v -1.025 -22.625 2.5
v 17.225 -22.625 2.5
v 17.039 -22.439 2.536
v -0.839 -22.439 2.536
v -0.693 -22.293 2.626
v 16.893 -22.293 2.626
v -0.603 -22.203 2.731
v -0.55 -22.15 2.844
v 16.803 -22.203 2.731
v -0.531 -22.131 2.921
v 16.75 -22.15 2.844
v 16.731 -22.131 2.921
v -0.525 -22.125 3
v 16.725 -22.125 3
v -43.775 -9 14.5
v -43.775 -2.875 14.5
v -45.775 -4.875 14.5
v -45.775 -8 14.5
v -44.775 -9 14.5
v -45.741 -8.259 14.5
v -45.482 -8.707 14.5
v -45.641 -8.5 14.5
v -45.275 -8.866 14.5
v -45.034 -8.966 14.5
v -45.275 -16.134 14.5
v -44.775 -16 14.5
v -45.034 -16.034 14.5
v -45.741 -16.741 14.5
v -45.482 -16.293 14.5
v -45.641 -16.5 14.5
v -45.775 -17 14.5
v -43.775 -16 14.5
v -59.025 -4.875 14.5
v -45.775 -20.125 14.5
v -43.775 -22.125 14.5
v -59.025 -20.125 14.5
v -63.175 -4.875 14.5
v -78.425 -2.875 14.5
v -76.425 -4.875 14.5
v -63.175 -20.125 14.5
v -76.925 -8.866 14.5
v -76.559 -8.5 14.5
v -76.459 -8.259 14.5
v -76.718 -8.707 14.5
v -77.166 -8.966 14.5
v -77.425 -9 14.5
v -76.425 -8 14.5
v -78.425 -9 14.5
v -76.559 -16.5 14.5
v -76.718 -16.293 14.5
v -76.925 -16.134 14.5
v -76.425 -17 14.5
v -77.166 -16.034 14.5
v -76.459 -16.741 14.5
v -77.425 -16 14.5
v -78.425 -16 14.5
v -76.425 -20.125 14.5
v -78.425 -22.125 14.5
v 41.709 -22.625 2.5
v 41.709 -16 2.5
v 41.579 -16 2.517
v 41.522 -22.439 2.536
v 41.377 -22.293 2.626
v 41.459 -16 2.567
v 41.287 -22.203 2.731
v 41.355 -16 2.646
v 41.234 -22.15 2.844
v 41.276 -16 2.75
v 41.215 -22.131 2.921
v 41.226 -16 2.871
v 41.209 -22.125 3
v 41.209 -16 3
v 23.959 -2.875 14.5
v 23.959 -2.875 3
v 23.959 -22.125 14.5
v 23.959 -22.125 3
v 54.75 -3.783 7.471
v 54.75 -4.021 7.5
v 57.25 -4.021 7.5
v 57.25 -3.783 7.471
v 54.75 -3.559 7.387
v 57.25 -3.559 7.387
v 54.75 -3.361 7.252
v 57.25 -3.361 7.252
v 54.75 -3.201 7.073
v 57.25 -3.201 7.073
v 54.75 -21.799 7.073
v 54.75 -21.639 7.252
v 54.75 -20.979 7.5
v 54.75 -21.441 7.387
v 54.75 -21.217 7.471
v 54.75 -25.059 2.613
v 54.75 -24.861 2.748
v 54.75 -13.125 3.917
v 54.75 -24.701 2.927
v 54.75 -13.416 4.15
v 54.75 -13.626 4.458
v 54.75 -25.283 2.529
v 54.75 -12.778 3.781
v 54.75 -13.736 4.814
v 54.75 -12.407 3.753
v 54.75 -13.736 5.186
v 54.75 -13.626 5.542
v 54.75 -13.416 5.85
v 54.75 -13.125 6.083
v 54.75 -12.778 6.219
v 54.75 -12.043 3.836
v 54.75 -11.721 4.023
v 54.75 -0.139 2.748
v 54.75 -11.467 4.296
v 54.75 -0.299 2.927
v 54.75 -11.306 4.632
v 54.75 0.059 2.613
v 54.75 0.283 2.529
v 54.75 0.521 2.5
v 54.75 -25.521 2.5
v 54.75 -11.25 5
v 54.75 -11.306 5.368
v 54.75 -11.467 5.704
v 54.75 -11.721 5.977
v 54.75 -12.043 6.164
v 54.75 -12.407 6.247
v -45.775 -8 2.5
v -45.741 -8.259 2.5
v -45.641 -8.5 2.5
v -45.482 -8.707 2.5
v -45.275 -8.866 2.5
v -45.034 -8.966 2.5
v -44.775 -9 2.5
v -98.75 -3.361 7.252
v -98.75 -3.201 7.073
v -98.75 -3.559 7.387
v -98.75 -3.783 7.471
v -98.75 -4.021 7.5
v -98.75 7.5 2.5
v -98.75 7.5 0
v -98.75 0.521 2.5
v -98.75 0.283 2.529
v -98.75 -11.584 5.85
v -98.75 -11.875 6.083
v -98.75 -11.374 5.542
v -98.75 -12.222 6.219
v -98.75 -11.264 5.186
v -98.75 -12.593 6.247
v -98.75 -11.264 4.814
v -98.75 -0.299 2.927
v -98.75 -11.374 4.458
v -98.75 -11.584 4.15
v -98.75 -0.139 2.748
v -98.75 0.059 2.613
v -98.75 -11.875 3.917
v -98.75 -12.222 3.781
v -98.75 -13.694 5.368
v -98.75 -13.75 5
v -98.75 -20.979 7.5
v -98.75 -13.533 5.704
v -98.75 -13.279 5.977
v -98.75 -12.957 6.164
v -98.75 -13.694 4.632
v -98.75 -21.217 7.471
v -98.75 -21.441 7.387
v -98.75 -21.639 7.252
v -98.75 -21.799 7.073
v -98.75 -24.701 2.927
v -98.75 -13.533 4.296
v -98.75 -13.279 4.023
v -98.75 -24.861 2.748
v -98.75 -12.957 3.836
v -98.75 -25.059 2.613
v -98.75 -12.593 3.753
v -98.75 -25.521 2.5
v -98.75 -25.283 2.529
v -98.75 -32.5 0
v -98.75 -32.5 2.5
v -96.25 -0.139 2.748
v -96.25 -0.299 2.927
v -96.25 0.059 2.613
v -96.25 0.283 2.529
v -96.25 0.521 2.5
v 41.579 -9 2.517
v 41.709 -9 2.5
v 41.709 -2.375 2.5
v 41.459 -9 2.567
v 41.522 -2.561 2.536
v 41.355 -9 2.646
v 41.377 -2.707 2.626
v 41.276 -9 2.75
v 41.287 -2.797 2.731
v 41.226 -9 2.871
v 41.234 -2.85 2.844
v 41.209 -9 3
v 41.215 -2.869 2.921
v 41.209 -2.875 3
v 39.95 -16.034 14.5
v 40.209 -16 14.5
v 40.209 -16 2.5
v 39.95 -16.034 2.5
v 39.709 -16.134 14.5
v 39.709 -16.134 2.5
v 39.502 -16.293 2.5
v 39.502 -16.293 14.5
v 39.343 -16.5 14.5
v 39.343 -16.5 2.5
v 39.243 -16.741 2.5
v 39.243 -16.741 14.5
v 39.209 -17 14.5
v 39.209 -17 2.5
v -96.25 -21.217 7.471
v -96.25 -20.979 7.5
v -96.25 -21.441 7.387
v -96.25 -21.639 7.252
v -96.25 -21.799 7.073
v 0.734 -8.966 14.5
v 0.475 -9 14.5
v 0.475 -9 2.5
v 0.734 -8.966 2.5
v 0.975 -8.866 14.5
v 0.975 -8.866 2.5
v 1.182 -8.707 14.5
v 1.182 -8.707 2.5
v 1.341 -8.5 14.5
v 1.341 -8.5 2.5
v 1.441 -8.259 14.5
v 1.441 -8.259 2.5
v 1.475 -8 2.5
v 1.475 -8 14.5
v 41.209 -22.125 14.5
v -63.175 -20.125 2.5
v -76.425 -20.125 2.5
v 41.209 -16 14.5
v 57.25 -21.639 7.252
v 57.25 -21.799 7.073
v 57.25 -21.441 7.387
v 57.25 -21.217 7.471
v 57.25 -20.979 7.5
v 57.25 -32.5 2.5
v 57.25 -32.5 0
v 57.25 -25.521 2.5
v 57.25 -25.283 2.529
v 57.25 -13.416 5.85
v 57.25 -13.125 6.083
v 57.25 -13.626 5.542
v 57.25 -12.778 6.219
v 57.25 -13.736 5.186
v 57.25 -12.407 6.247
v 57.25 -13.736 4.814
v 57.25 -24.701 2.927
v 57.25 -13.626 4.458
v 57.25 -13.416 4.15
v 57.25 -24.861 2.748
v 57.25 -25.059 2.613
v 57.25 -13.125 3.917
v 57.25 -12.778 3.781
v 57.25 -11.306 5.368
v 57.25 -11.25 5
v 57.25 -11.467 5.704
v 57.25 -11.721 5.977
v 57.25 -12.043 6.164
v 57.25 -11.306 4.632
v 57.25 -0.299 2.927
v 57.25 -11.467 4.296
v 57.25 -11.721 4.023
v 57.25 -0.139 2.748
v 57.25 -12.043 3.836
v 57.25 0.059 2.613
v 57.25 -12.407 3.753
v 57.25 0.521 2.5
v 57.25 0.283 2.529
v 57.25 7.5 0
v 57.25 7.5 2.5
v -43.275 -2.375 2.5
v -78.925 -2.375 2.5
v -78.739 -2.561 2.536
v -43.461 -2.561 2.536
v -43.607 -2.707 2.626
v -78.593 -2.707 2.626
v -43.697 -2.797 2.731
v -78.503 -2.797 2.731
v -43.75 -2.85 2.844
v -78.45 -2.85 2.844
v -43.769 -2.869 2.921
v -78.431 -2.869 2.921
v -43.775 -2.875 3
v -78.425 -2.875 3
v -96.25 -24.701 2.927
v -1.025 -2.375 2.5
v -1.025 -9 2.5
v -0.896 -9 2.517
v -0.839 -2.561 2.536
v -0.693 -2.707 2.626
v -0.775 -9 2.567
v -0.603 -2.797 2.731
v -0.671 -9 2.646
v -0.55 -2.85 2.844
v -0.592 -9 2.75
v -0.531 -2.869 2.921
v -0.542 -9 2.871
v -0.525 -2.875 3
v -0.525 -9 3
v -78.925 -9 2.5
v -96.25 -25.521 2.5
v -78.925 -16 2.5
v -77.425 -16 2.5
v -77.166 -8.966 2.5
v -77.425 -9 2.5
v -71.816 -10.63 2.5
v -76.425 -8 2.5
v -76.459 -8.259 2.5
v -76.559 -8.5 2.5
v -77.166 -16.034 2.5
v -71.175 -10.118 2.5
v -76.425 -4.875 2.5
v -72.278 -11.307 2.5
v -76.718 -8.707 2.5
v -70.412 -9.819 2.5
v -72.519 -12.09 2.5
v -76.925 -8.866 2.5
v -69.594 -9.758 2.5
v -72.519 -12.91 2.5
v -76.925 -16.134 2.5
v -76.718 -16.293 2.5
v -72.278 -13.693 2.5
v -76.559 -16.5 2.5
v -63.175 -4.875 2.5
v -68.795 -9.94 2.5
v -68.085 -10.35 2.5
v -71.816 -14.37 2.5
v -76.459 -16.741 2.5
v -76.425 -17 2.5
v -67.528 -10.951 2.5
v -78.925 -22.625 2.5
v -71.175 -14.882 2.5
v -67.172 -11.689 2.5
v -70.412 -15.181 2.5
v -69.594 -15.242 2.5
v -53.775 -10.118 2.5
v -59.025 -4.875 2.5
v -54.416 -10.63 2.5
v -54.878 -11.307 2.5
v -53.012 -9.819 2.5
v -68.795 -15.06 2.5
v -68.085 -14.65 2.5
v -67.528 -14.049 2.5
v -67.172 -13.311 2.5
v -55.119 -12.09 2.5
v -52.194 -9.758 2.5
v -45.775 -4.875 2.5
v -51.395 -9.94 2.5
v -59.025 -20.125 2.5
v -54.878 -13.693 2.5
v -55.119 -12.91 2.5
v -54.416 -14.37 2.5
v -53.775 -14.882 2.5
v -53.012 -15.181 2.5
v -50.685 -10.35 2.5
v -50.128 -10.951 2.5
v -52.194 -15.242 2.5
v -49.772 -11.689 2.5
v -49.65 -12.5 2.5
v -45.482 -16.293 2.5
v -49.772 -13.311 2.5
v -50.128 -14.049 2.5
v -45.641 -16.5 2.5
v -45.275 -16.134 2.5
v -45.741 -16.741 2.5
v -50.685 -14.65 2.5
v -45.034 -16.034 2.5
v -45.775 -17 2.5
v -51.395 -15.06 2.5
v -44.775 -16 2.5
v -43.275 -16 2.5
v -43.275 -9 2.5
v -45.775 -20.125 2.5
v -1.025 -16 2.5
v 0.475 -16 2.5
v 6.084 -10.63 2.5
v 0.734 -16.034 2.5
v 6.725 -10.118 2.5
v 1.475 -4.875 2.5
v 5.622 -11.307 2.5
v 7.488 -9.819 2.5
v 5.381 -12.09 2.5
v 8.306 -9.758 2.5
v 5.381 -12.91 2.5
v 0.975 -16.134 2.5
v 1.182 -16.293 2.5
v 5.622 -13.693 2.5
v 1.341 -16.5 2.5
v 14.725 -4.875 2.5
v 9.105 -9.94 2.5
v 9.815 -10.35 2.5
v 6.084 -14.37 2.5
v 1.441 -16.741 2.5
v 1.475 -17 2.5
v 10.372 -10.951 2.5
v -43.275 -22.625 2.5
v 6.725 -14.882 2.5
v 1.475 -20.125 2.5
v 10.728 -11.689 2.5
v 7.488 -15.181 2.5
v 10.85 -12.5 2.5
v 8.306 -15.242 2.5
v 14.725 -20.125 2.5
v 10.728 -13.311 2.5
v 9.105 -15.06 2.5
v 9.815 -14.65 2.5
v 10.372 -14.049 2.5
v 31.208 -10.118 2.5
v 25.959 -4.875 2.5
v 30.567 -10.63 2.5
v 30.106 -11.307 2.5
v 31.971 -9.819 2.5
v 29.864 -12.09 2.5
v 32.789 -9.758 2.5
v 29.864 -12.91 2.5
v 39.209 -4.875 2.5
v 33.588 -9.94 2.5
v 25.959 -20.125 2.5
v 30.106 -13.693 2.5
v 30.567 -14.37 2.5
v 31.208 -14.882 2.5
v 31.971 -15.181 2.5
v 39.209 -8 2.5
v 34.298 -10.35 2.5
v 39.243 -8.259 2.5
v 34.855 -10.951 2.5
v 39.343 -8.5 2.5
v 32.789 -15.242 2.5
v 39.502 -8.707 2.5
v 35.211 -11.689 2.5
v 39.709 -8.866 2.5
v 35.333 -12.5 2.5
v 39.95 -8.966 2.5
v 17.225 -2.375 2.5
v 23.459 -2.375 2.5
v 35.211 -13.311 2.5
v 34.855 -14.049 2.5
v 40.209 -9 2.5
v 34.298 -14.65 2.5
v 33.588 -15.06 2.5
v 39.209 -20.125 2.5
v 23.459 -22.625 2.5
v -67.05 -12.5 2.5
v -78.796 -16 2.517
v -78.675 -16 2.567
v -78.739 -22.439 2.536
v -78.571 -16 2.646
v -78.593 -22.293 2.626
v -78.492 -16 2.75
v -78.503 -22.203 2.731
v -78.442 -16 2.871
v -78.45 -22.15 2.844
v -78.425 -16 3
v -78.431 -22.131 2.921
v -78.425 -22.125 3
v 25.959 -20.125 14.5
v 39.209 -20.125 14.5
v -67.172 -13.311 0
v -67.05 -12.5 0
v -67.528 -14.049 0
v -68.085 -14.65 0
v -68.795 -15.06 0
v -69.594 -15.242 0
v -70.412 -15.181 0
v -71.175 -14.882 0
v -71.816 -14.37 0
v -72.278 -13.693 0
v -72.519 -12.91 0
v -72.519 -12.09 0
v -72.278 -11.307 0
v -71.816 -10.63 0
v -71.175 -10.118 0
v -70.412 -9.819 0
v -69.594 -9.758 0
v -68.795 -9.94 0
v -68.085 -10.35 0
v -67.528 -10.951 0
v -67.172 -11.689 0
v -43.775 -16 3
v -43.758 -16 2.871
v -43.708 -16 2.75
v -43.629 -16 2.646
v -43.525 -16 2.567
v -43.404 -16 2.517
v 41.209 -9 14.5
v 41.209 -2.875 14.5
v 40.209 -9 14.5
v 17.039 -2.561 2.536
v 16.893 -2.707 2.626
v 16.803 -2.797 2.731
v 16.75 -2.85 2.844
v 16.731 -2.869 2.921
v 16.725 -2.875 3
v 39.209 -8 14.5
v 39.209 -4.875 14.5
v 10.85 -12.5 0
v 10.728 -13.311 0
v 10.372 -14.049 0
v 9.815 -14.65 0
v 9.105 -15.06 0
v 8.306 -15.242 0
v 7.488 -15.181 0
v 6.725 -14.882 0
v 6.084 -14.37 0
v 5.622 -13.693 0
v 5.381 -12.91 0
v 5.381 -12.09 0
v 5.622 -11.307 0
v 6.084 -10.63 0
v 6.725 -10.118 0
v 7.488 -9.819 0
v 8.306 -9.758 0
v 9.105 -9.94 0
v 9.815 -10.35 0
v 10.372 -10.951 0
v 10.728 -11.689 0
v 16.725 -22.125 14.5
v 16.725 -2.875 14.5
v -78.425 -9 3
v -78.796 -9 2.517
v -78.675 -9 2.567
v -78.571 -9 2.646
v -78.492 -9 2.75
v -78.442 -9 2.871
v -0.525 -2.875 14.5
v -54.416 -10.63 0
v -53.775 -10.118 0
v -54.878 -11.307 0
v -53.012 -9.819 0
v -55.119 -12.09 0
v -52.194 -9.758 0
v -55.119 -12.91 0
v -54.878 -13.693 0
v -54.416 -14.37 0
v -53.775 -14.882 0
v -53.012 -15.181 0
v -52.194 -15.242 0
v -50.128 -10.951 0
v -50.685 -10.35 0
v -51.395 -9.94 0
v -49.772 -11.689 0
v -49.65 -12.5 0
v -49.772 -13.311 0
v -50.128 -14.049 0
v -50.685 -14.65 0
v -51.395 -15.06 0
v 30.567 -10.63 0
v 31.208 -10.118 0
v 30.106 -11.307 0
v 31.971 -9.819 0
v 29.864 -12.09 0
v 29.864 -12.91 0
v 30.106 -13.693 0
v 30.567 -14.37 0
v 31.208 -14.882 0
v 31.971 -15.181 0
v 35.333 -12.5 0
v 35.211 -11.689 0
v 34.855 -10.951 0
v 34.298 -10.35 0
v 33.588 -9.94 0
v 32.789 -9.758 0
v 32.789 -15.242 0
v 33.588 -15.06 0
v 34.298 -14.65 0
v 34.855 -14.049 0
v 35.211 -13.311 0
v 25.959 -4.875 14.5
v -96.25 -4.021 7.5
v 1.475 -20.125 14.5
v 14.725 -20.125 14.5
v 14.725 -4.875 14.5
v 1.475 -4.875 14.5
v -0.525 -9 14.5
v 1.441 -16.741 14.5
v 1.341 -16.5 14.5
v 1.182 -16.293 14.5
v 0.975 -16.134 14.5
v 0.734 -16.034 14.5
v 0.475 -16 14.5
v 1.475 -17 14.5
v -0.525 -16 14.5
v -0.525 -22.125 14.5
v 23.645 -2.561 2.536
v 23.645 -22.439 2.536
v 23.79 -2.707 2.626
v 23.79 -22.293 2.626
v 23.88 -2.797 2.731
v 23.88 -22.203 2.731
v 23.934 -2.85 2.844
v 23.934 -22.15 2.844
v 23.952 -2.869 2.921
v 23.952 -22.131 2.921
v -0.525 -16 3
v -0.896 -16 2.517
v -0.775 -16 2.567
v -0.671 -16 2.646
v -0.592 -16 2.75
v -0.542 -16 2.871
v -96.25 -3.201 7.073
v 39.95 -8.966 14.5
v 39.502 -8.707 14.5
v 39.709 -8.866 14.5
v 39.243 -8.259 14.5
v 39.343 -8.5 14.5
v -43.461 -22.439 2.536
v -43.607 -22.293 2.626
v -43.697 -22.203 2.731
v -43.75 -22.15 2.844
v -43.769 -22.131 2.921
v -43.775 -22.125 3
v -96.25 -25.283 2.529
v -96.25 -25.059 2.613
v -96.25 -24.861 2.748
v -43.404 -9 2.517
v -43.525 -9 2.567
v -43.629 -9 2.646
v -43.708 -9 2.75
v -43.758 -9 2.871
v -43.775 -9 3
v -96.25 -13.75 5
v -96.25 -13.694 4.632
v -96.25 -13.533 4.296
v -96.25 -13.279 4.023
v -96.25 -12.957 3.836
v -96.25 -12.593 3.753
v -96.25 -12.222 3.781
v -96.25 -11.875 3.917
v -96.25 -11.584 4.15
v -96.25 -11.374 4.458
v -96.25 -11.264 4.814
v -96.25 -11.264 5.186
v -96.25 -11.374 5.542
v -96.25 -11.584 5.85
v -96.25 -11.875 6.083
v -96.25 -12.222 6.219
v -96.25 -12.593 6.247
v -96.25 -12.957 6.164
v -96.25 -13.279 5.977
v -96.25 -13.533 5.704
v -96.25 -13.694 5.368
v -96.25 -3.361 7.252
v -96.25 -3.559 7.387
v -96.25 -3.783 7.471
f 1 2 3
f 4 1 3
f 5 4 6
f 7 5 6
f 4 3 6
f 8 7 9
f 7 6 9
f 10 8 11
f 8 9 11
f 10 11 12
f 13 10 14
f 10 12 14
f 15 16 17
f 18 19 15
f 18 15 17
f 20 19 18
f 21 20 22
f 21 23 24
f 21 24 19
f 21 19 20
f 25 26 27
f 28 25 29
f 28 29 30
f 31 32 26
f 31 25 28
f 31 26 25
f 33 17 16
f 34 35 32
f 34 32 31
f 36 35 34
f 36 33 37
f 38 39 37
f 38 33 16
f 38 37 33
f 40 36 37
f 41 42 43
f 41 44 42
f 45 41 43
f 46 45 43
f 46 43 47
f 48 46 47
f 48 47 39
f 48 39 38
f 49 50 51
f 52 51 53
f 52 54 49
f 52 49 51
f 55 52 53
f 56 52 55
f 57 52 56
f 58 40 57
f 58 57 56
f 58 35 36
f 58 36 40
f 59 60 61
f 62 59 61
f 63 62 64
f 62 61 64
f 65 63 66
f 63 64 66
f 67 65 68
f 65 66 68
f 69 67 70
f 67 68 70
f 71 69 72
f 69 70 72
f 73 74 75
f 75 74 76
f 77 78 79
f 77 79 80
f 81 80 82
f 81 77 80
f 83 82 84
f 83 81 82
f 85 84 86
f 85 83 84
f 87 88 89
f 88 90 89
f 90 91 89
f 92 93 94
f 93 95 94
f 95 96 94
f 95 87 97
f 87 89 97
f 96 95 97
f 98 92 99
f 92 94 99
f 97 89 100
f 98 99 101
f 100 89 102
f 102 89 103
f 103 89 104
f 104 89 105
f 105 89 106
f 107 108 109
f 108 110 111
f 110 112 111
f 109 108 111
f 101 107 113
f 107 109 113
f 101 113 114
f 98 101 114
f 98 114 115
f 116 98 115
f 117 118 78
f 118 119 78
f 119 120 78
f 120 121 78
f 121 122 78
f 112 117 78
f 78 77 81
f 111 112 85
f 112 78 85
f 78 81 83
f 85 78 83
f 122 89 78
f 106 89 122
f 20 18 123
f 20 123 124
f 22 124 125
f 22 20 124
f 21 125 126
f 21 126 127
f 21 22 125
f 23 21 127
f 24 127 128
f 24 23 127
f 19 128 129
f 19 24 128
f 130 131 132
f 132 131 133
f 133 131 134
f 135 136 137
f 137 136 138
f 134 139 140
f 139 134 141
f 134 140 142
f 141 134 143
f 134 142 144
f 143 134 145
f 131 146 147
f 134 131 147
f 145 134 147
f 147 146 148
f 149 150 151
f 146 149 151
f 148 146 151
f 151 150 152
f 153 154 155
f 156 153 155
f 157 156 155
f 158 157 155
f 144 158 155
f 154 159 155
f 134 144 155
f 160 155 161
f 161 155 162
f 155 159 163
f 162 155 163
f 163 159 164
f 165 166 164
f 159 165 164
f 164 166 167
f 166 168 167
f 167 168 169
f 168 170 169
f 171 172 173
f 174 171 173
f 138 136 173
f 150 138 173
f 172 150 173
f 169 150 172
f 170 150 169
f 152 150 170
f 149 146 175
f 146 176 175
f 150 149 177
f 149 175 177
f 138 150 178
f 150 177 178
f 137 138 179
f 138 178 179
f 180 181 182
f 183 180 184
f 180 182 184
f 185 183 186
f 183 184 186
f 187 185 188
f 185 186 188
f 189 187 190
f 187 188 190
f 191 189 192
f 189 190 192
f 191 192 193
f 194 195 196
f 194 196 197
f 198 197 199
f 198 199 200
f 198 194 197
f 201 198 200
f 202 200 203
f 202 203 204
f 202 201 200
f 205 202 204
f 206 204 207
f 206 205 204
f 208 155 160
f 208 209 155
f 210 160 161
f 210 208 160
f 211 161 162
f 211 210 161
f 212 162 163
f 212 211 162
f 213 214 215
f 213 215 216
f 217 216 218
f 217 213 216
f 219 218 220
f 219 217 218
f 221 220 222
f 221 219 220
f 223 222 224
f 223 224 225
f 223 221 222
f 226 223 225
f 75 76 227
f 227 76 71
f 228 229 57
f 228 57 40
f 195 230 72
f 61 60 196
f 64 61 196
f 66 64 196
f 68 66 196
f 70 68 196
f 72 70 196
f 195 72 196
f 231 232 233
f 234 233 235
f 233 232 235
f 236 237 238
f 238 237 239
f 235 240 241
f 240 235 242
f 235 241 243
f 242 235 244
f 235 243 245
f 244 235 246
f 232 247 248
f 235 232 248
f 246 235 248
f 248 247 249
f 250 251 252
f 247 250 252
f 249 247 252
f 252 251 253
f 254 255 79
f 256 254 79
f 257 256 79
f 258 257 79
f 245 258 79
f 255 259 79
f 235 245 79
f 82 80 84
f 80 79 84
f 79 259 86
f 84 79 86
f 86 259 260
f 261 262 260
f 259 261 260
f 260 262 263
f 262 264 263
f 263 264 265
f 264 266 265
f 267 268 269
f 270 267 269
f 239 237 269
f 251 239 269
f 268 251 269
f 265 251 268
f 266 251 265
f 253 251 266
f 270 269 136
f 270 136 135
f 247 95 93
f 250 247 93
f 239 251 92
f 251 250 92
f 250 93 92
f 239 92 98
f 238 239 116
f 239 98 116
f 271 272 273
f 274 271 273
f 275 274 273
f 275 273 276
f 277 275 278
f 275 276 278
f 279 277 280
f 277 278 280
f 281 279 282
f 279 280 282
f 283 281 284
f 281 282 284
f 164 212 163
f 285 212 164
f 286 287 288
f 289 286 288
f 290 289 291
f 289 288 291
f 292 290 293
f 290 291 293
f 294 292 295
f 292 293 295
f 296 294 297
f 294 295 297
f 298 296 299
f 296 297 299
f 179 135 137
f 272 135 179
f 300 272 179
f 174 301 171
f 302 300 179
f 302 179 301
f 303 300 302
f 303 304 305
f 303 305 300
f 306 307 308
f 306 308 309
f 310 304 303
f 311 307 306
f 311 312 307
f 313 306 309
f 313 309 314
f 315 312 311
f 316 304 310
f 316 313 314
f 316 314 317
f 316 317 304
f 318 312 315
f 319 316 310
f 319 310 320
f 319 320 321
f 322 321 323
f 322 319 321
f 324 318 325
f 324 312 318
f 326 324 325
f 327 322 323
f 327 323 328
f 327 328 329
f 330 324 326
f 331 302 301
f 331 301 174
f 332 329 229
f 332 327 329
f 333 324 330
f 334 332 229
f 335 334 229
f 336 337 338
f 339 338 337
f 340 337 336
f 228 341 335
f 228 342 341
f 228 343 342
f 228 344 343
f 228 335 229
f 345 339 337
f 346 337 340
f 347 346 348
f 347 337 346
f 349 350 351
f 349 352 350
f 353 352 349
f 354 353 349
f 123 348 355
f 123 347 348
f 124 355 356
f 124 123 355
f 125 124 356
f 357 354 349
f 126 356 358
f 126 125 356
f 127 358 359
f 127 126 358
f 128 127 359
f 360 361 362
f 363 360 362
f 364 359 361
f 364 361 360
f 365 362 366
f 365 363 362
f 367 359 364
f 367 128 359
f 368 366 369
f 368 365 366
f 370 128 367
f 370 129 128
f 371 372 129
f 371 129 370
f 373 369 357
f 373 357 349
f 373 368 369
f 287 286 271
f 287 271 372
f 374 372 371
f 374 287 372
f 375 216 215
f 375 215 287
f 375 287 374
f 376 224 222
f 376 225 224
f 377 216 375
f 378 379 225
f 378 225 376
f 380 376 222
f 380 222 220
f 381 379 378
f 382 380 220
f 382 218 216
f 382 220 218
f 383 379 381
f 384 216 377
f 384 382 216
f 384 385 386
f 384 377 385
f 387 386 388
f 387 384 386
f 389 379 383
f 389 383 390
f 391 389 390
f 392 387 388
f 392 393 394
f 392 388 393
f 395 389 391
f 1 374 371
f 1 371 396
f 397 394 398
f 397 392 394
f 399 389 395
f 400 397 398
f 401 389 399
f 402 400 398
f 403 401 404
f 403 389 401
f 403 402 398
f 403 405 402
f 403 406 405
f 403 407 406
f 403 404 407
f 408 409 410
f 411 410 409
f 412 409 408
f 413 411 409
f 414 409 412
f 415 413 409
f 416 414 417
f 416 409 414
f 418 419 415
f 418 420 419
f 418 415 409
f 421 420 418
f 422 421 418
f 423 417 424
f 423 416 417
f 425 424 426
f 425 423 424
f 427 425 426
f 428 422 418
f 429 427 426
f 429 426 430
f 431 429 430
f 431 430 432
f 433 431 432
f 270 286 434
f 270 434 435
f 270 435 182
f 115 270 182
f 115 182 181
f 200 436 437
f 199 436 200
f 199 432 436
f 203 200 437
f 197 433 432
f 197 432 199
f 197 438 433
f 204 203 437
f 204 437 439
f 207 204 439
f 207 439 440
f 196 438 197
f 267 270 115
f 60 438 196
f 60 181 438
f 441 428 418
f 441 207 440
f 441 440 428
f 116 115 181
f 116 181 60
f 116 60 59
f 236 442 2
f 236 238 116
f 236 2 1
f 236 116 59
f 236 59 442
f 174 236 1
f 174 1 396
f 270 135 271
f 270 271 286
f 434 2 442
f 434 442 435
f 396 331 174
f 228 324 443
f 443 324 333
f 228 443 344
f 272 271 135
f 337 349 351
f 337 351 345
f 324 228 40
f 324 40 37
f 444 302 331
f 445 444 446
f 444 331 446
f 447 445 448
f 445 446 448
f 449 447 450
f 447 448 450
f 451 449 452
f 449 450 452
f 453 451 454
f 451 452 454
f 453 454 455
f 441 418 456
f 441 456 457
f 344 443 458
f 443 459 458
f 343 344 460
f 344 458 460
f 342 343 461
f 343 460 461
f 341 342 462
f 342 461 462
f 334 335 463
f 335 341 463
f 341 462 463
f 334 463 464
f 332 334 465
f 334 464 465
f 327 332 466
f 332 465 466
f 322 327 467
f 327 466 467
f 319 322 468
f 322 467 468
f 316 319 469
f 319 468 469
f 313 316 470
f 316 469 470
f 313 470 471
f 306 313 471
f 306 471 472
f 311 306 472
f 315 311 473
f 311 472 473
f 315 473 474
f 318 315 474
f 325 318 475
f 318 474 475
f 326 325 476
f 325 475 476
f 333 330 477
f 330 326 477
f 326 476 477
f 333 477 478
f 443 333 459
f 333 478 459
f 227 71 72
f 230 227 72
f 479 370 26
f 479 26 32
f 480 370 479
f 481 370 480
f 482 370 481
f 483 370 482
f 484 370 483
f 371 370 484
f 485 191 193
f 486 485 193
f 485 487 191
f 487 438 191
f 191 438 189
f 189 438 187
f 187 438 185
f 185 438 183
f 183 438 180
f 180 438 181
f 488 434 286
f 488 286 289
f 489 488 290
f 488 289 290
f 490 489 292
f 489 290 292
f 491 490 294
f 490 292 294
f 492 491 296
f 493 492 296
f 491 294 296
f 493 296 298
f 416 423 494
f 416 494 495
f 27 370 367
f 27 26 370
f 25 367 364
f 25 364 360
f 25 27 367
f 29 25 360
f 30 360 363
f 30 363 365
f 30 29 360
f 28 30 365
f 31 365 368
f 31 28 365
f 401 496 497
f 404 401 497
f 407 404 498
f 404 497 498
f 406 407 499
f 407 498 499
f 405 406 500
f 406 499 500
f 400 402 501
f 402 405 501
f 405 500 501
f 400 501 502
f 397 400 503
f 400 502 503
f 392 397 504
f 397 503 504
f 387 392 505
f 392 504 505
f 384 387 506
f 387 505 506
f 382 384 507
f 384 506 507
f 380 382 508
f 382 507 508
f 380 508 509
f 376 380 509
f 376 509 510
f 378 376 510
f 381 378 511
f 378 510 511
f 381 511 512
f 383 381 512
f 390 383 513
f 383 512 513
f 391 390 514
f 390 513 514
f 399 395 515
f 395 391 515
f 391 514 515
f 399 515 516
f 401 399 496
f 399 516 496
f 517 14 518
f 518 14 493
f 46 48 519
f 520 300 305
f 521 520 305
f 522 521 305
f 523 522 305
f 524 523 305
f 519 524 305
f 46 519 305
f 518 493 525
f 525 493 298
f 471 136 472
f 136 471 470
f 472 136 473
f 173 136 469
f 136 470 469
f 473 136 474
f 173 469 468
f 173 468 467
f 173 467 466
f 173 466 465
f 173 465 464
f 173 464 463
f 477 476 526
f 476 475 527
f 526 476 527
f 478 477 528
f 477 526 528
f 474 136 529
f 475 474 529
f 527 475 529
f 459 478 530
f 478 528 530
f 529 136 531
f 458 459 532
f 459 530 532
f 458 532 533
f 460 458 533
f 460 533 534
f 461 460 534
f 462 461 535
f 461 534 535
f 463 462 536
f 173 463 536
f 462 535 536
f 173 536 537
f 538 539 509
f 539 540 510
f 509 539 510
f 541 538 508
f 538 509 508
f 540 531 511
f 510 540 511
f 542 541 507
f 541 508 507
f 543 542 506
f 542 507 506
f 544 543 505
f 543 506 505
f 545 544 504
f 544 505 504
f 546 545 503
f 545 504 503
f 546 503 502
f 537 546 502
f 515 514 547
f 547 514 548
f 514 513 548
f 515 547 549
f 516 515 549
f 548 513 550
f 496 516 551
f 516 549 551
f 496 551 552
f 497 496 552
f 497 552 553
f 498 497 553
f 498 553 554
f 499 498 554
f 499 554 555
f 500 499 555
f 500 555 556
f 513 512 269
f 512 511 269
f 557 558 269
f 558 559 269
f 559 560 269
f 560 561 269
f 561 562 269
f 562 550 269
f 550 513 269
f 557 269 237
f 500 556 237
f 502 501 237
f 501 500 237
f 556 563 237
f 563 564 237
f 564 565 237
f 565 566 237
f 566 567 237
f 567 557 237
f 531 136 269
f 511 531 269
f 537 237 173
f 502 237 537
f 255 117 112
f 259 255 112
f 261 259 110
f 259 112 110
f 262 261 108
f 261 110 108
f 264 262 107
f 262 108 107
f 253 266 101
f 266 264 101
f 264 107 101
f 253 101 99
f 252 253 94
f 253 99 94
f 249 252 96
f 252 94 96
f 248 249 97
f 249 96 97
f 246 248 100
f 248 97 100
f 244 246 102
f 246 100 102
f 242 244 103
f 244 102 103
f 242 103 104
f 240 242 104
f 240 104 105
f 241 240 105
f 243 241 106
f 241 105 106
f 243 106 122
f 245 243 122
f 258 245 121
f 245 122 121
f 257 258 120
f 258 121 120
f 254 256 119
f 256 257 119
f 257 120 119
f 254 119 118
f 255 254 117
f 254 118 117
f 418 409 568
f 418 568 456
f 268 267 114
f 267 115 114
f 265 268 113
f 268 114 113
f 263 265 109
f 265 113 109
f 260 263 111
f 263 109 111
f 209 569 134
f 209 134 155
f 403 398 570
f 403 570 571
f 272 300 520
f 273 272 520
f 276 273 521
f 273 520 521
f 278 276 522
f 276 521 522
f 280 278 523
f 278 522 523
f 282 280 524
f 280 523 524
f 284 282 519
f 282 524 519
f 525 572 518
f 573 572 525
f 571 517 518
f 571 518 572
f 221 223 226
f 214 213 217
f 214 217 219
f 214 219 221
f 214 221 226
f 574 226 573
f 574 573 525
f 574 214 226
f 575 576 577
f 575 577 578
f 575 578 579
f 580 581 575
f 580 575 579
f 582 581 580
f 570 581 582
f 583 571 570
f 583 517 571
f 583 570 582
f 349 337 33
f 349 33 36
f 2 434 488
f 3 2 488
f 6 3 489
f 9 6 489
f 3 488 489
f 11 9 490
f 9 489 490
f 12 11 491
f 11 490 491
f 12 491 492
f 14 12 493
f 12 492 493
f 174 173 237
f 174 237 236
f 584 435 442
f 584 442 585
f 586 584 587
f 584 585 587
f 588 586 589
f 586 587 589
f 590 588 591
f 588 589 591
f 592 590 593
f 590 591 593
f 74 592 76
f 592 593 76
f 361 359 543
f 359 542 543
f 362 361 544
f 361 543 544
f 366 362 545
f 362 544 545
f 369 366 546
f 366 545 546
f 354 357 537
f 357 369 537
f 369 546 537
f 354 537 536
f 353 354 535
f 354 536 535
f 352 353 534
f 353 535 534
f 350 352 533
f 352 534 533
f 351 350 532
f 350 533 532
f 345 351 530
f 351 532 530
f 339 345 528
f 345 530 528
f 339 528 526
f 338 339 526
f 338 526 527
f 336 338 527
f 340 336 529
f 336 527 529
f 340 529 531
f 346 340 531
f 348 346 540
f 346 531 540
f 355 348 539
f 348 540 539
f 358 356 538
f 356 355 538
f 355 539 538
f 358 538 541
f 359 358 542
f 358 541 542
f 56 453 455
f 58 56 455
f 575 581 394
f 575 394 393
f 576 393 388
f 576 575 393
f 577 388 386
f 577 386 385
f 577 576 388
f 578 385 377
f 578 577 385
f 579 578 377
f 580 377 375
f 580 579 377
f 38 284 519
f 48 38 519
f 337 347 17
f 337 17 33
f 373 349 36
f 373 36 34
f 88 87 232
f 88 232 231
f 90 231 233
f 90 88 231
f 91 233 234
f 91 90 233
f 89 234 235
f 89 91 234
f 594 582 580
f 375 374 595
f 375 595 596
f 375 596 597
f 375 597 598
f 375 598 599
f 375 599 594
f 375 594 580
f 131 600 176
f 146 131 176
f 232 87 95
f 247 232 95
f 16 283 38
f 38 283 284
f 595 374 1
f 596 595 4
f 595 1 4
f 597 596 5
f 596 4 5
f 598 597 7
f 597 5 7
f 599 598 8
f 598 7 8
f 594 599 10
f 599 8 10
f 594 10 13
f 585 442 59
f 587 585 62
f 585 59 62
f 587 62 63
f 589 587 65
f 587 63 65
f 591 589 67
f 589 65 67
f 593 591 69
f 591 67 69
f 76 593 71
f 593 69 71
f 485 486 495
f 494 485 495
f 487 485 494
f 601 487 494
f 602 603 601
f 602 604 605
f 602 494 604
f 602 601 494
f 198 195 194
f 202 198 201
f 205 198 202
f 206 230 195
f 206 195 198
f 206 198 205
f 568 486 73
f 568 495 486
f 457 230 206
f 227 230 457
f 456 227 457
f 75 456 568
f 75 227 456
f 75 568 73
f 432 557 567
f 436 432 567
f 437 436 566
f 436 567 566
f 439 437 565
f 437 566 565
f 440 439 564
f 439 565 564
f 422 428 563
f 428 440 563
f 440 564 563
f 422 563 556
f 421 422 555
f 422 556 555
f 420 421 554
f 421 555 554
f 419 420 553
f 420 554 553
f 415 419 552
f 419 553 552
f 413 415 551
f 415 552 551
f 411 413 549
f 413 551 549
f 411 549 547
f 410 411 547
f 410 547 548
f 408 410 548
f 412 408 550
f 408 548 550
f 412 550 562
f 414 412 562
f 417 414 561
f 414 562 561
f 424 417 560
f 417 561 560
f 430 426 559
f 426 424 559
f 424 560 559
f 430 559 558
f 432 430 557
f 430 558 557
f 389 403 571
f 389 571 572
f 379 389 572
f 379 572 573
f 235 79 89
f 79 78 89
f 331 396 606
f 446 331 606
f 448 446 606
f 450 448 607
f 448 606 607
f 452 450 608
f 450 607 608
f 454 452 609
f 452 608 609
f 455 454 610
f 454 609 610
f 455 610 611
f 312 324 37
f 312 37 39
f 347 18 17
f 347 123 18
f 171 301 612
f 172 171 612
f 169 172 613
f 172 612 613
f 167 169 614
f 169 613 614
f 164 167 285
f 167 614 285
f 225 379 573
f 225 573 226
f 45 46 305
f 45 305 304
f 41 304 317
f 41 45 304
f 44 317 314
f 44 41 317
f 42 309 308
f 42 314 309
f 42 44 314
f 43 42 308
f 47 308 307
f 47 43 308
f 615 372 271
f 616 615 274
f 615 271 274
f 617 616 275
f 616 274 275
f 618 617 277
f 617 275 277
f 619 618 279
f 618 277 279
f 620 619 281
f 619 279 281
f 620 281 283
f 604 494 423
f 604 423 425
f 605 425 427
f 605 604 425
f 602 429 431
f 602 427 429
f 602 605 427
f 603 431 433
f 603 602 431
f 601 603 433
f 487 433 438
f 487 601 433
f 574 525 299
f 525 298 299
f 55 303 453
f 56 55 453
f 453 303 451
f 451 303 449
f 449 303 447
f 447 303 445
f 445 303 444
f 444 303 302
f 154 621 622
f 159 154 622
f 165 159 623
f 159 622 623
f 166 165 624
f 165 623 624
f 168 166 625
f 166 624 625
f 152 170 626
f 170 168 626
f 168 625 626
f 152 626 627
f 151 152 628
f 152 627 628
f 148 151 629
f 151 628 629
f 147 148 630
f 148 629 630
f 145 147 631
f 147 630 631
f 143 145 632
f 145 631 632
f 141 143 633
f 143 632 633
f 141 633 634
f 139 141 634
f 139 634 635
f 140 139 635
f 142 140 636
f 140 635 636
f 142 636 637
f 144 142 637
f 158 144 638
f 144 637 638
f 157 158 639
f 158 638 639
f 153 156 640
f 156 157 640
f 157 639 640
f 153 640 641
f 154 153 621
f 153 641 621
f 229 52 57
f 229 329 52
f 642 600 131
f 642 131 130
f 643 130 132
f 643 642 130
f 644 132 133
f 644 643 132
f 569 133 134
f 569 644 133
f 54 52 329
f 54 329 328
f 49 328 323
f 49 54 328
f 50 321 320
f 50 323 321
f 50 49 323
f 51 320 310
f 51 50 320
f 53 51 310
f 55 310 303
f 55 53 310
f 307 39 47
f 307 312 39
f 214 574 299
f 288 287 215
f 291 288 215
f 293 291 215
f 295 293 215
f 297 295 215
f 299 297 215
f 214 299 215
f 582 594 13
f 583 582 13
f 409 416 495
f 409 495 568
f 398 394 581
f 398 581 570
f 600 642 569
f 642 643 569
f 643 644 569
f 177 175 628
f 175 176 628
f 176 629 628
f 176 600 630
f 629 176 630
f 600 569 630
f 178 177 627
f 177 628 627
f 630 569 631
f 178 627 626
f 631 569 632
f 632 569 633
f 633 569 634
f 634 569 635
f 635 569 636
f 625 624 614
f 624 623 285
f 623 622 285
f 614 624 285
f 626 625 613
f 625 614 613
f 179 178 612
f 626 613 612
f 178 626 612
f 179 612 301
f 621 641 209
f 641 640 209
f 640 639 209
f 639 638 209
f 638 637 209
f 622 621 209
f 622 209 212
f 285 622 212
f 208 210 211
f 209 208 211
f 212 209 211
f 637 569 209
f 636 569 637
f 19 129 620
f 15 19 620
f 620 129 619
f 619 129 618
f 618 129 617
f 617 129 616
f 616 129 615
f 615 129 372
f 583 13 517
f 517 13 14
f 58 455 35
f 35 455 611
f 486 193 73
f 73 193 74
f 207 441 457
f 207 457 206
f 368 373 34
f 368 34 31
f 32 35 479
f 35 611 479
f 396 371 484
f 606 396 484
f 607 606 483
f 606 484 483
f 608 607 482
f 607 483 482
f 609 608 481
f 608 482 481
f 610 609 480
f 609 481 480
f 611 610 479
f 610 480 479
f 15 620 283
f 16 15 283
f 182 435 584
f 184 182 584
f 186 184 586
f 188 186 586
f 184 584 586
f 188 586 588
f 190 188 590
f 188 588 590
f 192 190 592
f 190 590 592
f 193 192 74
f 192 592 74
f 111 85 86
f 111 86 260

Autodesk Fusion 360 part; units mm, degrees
sketch "Sketch1" plane through (0, 0, 0) normal (0, 0, 1) x (1, 0, 0)
  line L0 (68.541, -12.5) -> (-110, -12.5) construction
  line L1 (-20.75, -50) -> (-20.75, 25) construction
  point P0 (-20.75, -12.5)
sketch "Sketch2" plane through (0, 0, 0) normal (0, 0, 1) x (1, 0, 0)
  line L0 (54.25, 7.5) -> (-95.75, 7.5)
  line L1 (-95.75, 7.5) -> (-95.75, -32.5)
  line L2 (-95.75, -32.5) -> (54.25, -32.5)
  line L3 (54.25, -32.5) -> (54.25, 7.5)
  line L4 (54.25, 7.5) -> (-95.75, -32.5) construction
  line L5 (-95.75, 7.5) -> (54.25, -32.5) construction
  line L6 (26.6666, -12.5) -> (38.5, -12.5) construction
  circle A0 centre (32.5833, -12.5) radius 2.75
  line L7 (14, -12.5) -> (2.2, -12.5) construction
  circle A1 centre (8.1, -12.5) radius 2.75
  line L8 (-49.1, -12.5) -> (-52.4, -12.5) construction
  circle A2 centre (-52.4, -12.5) radius 2.75
  line L9 (-73.1, -12.5) -> (-69.8, -12.5) construction
  circle A3 centre (-69.8, -12.5) radius 2.75
  point P0 (-20.75, -12.5)
  dimension "d1" = 150
  dimension "d2" = 40
  dimension "d3" = 5.5
  dimension "d4" = 5.5
  dimension "d5" = 3.3
  dimension "d6" = 5.5
  dimension "d7" = 3.3
  dimension "d8" = 5.5
extrude "Extrude1" add sketch "Sketch2" along normal blind 2.5
sketch "Sketch3" plane through (0, 0, 2.5) normal (0, 0, 1) x (-1, 0, 0)
  circle A0 centre (-32.5833, 12.5) radius 2.75
  circle A1 centre (69.8, 12.5) radius 2.75
  circle A2 centre (-8.1, 12.5) radius 2.75
  circle A3 centre (52.4, 12.5) radius 2.75
  line L0 (-54.25, 32.5) -> (-54.25, -7.5)
  line L1 (-54.25, -7.5) -> (95.75, -7.5)
  line L2 (95.75, -7.5) -> (95.75, 32.5)
  line L3 (95.75, 32.5) -> (-54.25, 32.5)
sketch "Sketch4" plane through (0, 0, 2.5) normal (0, 0, 1) x (-1, 0, 0)
  line L0 (-29.8338, 12.5) -> (-35.3337, 12.5) construction
  line L1 (-39.2087, 4.875) -> (-25.9587, 4.875)
  line L2 (-25.9587, 4.875) -> (-25.9587, 20.125)
  line L3 (-25.9587, 20.125) -> (-39.2087, 20.125)
  line L4 (-39.2087, 20.125) -> (-39.2087, 4.875)
  line L5 (-39.2087, 4.875) -> (-25.9587, 20.125) construction
  line L6 (-25.9587, 4.875) -> (-39.2087, 20.125) construction
  line L7 (-41.2087, 2.875) -> (-23.9587, 2.875)
  line L8 (-23.9587, 2.875) -> (-23.9587, 22.125)
  line L9 (-23.9587, 22.125) -> (-41.2087, 22.125)
  line L10 (-41.2087, 22.125) -> (-41.2087, 2.875)
  line L11 (-41.2087, 2.875) -> (-23.9587, 22.125) construction
  line L12 (-23.9587, 2.875) -> (-41.2087, 22.125) construction
  line L13 (-39.2087, 12.5) -> (-39.2087, 9)
  line L14 (-39.2087, 9) -> (-41.2087, 9)
  line L15 (-41.2087, 9) -> (-41.2087, 16)
  line L16 (-41.2087, 16) -> (-39.2087, 16)
  line L17 (-39.2087, 16) -> (-39.2087, 12.5)
  line L18 (-5.35, 12.5) -> (-10.85, 12.5) construction
  line L19 (-14.725, 4.875) -> (-1.475, 4.875)
  line L20 (-1.475, 4.875) -> (-1.475, 20.125)
  line L21 (-1.475, 20.125) -> (-14.725, 20.125)
  line L22 (-14.725, 20.125) -> (-14.725, 4.875)
  line L23 (-14.725, 4.875) -> (-1.475, 20.125) construction
  line L24 (-1.475, 4.875) -> (-14.725, 20.125) construction
  line L25 (-16.725, 2.875) -> (0.525, 2.875)
  line L26 (0.525, 2.875) -> (0.525, 22.125)
  line L27 (0.525, 22.125) -> (-16.725, 22.125)
  line L28 (-16.725, 22.125) -> (-16.725, 2.875)
  line L29 (-16.725, 2.875) -> (0.525, 22.125) construction
  line L30 (0.525, 2.875) -> (-16.725, 22.125) construction
  line L31 (-1.475, 16) -> (-1.475, 9)
  line L32 (0.525, 16) -> (0.525, 9)
  line L33 (0.525, 9) -> (-1.475, 9)
  line L34 (0.525, 16) -> (-1.475, 16)
  line L35 (55.15, 12.5) -> (49.65, 12.5) construction
  line L36 (45.775, 4.875) -> (59.025, 4.875)
  line L37 (59.025, 4.875) -> (59.025, 20.125)
  line L38 (59.025, 20.125) -> (45.775, 20.125)
  line L39 (45.775, 20.125) -> (45.775, 4.875)
  line L40 (45.775, 4.875) -> (59.025, 20.125) construction
  line L41 (59.025, 4.875) -> (45.775, 20.125) construction
  line L42 (61.025, 22.125) -> (43.775, 22.125)
  line L43 (43.775, 22.125) -> (43.775, 2.875)
  line L44 (43.775, 2.875) -> (61.025, 2.875)
  line L45 (61.025, 22.125) -> (43.775, 2.875) construction
  line L46 (43.775, 22.125) -> (61.025, 2.875) construction
  line L47 (72.55, 12.5) -> (67.05, 12.5) construction
  line L48 (63.175, 4.875) -> (76.425, 4.875)
  line L49 (76.425, 4.875) -> (76.425, 20.125)
  line L50 (76.425, 20.125) -> (63.175, 20.125)
  line L51 (63.175, 20.125) -> (63.175, 4.875)
  line L52 (63.175, 4.875) -> (76.425, 20.125) construction
  line L53 (76.425, 4.875) -> (63.175, 20.125) construction
  line L54 (61.175, 2.875) -> (78.425, 2.875)
  line L55 (78.425, 2.875) -> (78.425, 22.125)
  line L56 (78.425, 22.125) -> (61.175, 22.125)
  line L57 (61.175, 2.875) -> (78.425, 22.125) construction
  line L58 (78.425, 2.875) -> (61.175, 22.125) construction
  line L59 (61.175, 2.875) -> (61.025, 2.875)
  line L60 (61.175, 22.125) -> (61.025, 22.125)
  line L61 (43.775, 16) -> (43.775, 9)
  line L62 (45.775, 16) -> (45.775, 9)
  line L63 (45.775, 9) -> (43.775, 9)
  line L64 (45.775, 16) -> (43.775, 16)
  line L65 (76.425, 16) -> (76.425, 9)
  line L66 (78.425, 16) -> (78.425, 9)
  line L67 (78.425, 9) -> (76.425, 9)
  line L68 (76.425, 16) -> (78.425, 16)
  point P0 (-32.5837, 12.5)
  point P1 (-32.5837, 12.5)
  point P2 (-8.1, 12.5)
  point P3 (-8.1, 12.5)
  point P4 (-1.475, 12.5)
  point P5 (0.525, 12.5)
  point P6 (52.4, 12.5)
  point P7 (52.4, 12.5)
  point P8 (69.8, 12.5)
  point P9 (69.8, 12.5)
  point P10 (43.775, 12.5)
  point P11 (45.775, 12.5)
  point P12 (76.425, 12.5)
  point P13 (78.425, 12.5)
  dimension "d11" = 13.25
  dimension "d12" = 15.25
  dimension "d13" = 17.25
  dimension "d14" = 19.25
  dimension "d15" = 3.5
  dimension "d16" = 7
  dimension "d17" = 13.25
  dimension "d18" = 15.25
  dimension "d19" = 17.25
  dimension "d20" = 19.25
  dimension "d21" = 7
  dimension "d22" = 7
  dimension "d23" = 13.25
  dimension "d24" = 15.25
  dimension "d25" = 17.25
  dimension "d26" = 19.25
  dimension "d27" = 13.25
  dimension "d28" = 15.25
  dimension "d29" = 17.25
  dimension "d30" = 19.25
  dimension "d31" = 7
  dimension "d32" = 7
  dimension "d33" = 7
  dimension "d34" = 7
extrude "Extrude2" add sketch "Sketch4" along normal blind 12 contours L1 L2 L3 L4 L7 L8 L9 L10 L14 L16 | L19 L20 L21 L22 L25 L26 L27 L28 L33 L34 | L36 L37 L38 L39 L42 L43 L44 L48 L49 L50 L51 L54 L55 L56 L59 L60 L63 L64 L67 L68
sketch "Sketch5" plane through (0, 0, 2.5) normal (0, 0, 1) x (-1, 0, 0)
sketch "Sketch7" plane through (54.25, 0, 0) normal (1, 0, 0) x (0, 1, 0)
  line L0 (-32.5, 0) -> (7.5, 0)
  line L1 (7.5, 0) -> (7.5, 2.5)
  line L2 (7.5, 2.5) -> (-32.5, 2.5)
  line L3 (-32.5, 2.5) -> (-32.5, 0)
  line L4 (-25, 2.5) -> (0, 2.5)
  line L5 (-21.5, 2.5) -> (-3.5, 2.5)
  line L6 (-12.5, 7.5) -> (-3.5, 7.5)
  line L7 (-3.5, 7.5) -> (0, 2.5)
  line L8 (-12.5, 7.5) -> (-21.5, 7.5)
  line L9 (-21.5, 7.5) -> (-25, 2.5)
  line L10 (-12.5, 2.5) -> (-12.5, 7.5) construction
  circle A0 centre (-12.5, 5) radius 1.25
  point P0 (-12.5, 2.5)
  point P1 (-12.5, 2.5)
  dimension "d39" = 25
  dimension "d40" = 18
  dimension "d41" = 2.5
extrude "Extrude3" add sketch "Sketch7" against normal blind 2.5 contours L2 L4 L5 L6 L7 L8 L9
sketch "Sketch8" plane through (-95.75, 0, 0) normal (-1, 0, 0) x (0, -1, 0)
  line L0 (-7.5, 0) -> (32.5, 0)
  line L1 (32.5, 0) -> (32.5, 2.5)
  line L2 (32.5, 2.5) -> (-7.5, 2.5)
  line L3 (-7.5, 2.5) -> (-7.5, 0)
  line L4 (0, 2.5) -> (25, 2.5)
  line L5 (3.5, 7.5) -> (21.5, 7.5)
  line L6 (3.5, 7.5) -> (0, 2.5)
  line L7 (21.5, 7.5) -> (25, 2.5)
  circle A0 centre (12.5, 5) radius 1.25
  point P0 (12.5, 2.5)
  dimension "d44" = 25
  dimension "d46" = 18
  dimension "d47" = 2.5
extrude "Extrude4" add sketch "Sketch8" against normal blind 2.5 contours L2 L4 L5 L6 L7
fillet "Fillet1" radius 1 4 edges at (-94.5, -21.5, 7.5) (-94.5, -25, 2.5) (-94.5, -3.5, 7.5) (-94.5, 0, 2.5)
fillet "Fillet2" radius 1 4 edges at (53, -25, 2.5) (53, -21.5, 7.5) (53, -3.5, 7.5) (53, 0, 2.5)
fillet "Fillet3" radius 0.5 5 edges at (41.2087, -19.0625, 2.5) (32.5837, -22.125, 2.5) (41.2087, -5.9375, 2.5) (32.5837, -2.875, 2.5) (23.9587, -12.5, 2.5)
fillet "Fillet4" radius 0.5 15 edges at (16.725, -12.5, 2.5) (8.1, -2.875, 2.5) (8.1, -22.125, 2.5) (-0.525, -5.9375, 2.5) (-0.525, -19.0625, 2.5) (-52.4, -22.125, 2.5) (-61.1, -22.125, 2.5) (-69.8, -22.125, 2.5) (-78.425, -19.0625, 2.5) (-78.425, -5.9375, 2.5) (-43.775, -19.0625, 2.5) (-43.775, -5.9375, 2.5) (-69.8, -2.875, 2.5) (-61.1, -2.875, 2.5) (-52.4, -2.875, 2.5)
fillet "Fillet5" radius 1 8 edges at (-45.775, -16, 8.5) (-45.775, -9, 8.5) (-76.425, -9, 8.5) (-76.425, -16, 8.5) (1.475, -16, 8.5) (1.475, -9, 8.5) (39.2087, -16, 8.5) (39.2087, -9, 8.5)
extrude "Extrude5" add 1 faces at (54.25, -20.0421, 4.8192) along direction (1, 0, 0) blind 3
extrude "Extrude6" cut 1 faces at (51.75, -20.0421, 4.8192) along direction (1, 0, 0) blind 3
extrude "Extrude7" add 1 faces at (-95.75, -20.0421, 4.8192) along direction (-1, 0, 0) blind 3
extrude "Extrude8" cut 1 faces at (-93.25, -20.0421, 4.8192) along direction (-1, 0, 0) blind 3
